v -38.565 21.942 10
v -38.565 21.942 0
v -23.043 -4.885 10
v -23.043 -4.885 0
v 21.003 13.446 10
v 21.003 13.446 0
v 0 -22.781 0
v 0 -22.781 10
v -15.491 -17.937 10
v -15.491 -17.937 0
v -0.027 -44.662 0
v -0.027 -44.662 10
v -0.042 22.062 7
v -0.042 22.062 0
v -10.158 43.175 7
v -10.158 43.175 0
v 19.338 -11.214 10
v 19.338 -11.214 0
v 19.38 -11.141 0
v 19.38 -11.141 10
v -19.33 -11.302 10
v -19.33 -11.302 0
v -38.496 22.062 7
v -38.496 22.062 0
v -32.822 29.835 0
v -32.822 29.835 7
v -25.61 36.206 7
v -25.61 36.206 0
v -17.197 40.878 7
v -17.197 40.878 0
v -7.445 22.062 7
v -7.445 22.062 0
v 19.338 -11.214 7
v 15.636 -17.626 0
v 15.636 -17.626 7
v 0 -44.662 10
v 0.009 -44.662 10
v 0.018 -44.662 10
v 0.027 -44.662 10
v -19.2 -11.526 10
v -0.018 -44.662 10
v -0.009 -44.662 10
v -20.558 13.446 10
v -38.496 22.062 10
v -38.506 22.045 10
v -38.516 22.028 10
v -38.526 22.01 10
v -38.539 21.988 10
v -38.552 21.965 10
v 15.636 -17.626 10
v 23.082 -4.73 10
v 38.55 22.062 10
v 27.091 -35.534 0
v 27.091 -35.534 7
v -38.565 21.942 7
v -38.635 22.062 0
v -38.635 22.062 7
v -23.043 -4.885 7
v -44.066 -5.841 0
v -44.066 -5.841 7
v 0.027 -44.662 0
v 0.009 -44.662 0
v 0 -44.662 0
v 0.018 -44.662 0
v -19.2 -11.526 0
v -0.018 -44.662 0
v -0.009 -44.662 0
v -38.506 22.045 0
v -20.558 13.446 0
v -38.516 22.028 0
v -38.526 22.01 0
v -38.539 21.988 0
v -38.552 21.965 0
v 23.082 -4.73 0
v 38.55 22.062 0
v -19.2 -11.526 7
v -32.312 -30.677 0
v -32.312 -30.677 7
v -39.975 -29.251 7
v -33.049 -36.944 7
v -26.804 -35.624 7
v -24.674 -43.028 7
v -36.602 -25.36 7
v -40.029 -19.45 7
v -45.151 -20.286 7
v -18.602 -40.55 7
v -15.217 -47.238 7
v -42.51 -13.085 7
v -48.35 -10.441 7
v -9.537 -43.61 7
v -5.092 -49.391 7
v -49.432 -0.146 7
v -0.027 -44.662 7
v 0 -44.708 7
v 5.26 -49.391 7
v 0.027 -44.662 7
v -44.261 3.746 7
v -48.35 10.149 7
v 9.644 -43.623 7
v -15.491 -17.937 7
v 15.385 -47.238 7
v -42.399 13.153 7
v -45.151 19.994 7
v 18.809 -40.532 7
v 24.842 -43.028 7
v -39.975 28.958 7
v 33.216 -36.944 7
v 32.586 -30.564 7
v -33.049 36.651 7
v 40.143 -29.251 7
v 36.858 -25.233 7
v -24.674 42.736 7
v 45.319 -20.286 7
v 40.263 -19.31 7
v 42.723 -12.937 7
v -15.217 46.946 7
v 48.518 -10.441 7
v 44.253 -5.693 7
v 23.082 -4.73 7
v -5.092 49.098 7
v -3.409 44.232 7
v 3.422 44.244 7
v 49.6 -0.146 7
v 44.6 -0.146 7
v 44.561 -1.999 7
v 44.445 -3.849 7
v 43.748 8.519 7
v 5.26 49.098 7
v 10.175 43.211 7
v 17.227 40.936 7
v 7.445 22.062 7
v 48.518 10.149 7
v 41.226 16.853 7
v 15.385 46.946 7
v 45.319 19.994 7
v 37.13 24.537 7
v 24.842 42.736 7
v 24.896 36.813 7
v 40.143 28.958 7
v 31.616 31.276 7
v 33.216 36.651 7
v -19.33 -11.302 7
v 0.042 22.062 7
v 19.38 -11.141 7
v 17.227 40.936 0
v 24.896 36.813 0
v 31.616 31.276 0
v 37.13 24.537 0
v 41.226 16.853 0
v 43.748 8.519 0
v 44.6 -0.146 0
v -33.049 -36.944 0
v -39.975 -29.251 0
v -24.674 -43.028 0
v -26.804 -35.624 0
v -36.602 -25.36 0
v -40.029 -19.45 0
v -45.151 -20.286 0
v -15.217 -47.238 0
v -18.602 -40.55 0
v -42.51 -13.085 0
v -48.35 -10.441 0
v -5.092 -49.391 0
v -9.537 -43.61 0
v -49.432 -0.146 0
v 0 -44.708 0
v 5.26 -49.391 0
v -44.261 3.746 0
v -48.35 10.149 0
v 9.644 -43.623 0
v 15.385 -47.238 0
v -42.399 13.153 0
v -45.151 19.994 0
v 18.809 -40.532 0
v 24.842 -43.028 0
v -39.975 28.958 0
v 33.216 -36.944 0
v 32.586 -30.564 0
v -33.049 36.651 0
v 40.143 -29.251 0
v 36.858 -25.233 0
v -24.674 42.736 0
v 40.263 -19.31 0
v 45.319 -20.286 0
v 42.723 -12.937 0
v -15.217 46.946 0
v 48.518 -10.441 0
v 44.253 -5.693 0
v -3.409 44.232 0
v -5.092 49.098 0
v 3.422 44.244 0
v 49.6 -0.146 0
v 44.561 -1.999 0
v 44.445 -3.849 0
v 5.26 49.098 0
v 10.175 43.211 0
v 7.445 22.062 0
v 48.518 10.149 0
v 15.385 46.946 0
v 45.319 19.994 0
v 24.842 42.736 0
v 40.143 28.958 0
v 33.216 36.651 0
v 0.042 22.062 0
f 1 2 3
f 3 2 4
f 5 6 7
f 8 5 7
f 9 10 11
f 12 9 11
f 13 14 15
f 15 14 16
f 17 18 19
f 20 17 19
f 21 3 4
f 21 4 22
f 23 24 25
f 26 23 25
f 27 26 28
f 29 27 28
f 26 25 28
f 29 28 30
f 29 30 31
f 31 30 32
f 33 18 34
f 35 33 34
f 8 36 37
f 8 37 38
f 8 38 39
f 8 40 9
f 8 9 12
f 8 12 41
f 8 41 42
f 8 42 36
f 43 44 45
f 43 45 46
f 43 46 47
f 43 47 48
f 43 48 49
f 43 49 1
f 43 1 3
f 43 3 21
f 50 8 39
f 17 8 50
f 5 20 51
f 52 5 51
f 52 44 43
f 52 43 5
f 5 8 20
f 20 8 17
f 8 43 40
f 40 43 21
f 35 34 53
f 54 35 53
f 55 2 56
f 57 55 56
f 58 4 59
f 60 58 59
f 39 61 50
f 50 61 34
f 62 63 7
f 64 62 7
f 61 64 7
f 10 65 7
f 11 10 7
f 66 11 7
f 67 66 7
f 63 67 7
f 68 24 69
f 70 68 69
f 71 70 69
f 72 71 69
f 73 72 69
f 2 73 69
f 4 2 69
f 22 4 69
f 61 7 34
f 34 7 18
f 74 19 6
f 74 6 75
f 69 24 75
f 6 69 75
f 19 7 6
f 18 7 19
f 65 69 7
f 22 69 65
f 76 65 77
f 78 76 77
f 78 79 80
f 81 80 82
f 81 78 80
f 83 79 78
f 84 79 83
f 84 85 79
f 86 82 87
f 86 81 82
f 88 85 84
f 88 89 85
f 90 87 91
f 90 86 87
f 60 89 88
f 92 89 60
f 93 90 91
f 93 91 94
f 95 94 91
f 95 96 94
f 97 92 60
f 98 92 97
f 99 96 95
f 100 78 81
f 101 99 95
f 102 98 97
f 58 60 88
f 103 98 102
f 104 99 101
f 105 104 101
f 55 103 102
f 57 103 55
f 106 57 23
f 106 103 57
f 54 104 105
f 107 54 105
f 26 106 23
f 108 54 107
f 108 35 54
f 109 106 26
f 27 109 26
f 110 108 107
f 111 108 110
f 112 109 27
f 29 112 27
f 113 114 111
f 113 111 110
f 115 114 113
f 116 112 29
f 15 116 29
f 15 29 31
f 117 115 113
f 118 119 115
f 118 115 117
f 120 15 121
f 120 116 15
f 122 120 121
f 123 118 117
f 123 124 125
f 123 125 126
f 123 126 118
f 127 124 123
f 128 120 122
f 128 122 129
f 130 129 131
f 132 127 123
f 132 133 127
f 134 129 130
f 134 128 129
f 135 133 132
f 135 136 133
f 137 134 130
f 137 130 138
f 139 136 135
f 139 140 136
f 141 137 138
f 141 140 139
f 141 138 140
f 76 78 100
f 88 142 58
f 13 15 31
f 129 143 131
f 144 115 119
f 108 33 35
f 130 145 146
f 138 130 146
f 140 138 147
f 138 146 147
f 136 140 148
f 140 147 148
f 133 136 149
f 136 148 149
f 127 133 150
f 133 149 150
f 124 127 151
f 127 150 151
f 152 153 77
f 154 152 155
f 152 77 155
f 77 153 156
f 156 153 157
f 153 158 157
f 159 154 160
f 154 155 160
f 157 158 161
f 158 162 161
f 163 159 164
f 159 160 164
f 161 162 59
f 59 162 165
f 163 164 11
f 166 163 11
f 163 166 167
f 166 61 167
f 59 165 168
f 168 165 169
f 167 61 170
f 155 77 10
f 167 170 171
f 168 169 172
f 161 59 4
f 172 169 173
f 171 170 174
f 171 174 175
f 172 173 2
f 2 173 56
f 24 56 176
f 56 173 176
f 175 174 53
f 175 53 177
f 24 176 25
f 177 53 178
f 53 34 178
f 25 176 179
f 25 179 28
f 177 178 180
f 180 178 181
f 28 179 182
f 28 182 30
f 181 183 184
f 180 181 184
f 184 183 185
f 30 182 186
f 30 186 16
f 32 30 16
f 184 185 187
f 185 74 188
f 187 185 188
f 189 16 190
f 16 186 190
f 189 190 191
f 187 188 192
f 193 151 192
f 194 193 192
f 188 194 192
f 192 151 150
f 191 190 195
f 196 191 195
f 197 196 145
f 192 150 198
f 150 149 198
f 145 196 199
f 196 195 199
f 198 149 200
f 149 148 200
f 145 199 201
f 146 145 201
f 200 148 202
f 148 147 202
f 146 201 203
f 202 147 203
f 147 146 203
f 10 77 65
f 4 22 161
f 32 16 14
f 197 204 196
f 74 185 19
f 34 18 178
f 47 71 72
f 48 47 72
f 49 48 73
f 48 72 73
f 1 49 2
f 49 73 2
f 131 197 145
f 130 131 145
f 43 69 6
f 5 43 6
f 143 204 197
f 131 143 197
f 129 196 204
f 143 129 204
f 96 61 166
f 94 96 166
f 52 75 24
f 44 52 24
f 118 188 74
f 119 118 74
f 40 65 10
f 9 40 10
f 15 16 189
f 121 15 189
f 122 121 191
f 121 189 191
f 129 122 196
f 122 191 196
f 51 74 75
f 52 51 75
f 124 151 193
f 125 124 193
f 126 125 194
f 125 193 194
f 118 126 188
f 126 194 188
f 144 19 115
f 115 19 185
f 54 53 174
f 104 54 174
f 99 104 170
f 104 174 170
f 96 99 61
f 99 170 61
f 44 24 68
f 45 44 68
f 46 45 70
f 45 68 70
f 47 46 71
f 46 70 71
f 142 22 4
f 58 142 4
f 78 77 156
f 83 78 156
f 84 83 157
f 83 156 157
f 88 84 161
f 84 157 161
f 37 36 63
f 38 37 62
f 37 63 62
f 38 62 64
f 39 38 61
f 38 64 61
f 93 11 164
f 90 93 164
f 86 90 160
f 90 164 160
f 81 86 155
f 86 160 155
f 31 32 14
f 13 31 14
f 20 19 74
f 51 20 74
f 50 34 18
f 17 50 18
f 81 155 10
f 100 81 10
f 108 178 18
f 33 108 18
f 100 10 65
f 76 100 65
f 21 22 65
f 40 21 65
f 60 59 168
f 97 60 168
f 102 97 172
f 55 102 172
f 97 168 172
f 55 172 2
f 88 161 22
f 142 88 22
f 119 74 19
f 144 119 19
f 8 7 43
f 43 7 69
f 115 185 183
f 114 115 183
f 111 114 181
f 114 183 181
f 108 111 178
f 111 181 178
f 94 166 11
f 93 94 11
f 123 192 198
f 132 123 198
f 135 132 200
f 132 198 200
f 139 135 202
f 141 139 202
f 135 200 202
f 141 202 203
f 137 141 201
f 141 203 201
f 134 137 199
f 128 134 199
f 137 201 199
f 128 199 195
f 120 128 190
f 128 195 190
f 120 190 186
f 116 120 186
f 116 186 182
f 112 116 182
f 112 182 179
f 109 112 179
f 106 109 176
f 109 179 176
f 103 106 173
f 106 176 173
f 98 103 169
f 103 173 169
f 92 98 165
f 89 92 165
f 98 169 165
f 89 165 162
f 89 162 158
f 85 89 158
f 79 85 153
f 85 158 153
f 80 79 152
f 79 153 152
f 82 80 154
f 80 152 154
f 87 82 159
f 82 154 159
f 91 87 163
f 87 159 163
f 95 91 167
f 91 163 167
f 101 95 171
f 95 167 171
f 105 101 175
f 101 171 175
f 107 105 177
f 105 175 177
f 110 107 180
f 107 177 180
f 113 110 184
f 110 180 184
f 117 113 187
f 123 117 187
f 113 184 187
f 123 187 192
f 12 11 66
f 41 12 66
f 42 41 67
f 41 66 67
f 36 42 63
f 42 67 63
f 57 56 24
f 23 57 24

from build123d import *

# Parameters (mm, degrees)
F0_R     = 49.5157627348
F1_DEPTH = 7
F2_DEPTH = 10


with BuildPart() as f1:
    # F0 (on Top) → F1 (new body)
    with BuildSketch(Plane.XY):
        with Locations((0.0839262699, -0.1461637082)):
            Circle(F0_R)
        with BuildLine():
            Line((0.0267643967, -44.6618897427), (0, -44.7082470376))
            Line((0, -44.7082470376), (-0.0268818374, -44.6617885317))
            ThreePointArc((-0.0268818374, -44.6617885317), (-14.1516044467, -42.324390284), (-26.8038826396, -35.6243099945))
            ThreePointArc((-26.8038826396, -35.6243099945), (-29.6611996613, -33.2653517296), (-32.3124416737, -30.6769428651))
            ThreePointArc((-32.3124416737, -30.6769428651), (-38.429049495, -22.4711234975), (-42.509896824, -13.0852272796))
            ThreePointArc((-42.509896824, -13.0852272796), (-43.4389725447, -9.4955171959), (-44.066075615, -5.8409389824))
            ThreePointArc((-44.066075615, -5.8409389824), (-43.5841571557, 8.499738315), (-38.5652678357, 21.9421347063))
            Line((-38.5652678357, 21.9421347063), (-38.6347375564, 22.0621956747))
            Line((-38.6347375564, 22.0621956747), (-38.4964042805, 22.0621956747))
            ThreePointArc((-38.4964042805, 22.0621956747), (-29.3887182603, 33.2157360617), (-17.1971452384, 40.8784350026))
            ThreePointArc((-17.1971452384, 40.8784350026), (-13.7255689437, 42.1734649977), (-10.1583201055, 43.1753034997))
            ThreePointArc((-10.1583201055, 43.1753034997), (0.0064318364, 44.3695315741), (10.1752800628, 43.2107009211))
            ThreePointArc((10.1752800628, 43.2107009211), (13.7485980478, 42.2204490553), (17.2271071561, 40.9362471383))
            ThreePointArc((17.2271071561, 40.9362471383), (37.1298093388, 24.5369414349), (44.5996890047, -0.1461637082))
            ThreePointArc((44.5996890047, -0.1461637082), (44.5128837908, -2.9248082447), (44.2528066877, -5.6926161328))
            ThreePointArc((44.2528066877, -5.6926161328), (43.6385474147, -9.3466043928), (42.7225405888, -12.9368517593))
            ThreePointArc((42.7225405888, -12.9368517593), (38.6743964683, -22.3368992014), (32.5863955708, -30.5639647662))
            ThreePointArc((32.5863955708, -30.5639647662), (29.9421533065, -33.1634229841), (27.0907472686, -35.5337992806))
            ThreePointArc((27.0907472686, -35.5337992806), (14.3107158099, -42.3273395008), (0.0267643967, -44.6618897427))
        make_face(mode=Mode.SUBTRACT)
        with BuildLine():
            Line((0.0424022413, 22.0621956747), (7.4453759007, 22.0621956747))
            Line((7.4453759007, 22.0621956747), (17.2271071561, 40.9362471383))
            ThreePointArc((17.2271071561, 40.9362471383), (13.7485980478, 42.2204490553), (10.1752800628, 43.2107009211))
            Line((10.1752800628, 43.2107009211), (0.0424022413, 22.0621956747))
        make_face()
        with BuildLine():
            Line((-17.1971452384, 40.8784350026), (-7.4453759007, 22.0621956747))
            Line((-7.4453759007, 22.0621956747), (-0.0424022413, 22.0621956747))
            Line((-0.0424022413, 22.0621956747), (-10.1583201055, 43.1753034997))
            ThreePointArc((-10.1583201055, 43.1753034997), (-13.7255689437, 42.1734649977), (-17.1971452384, 40.8784350026))
        make_face()
        with BuildLine():
            Line((23.0815807572, -4.7297764472), (19.3800939274, -11.1409396998))
            Line((19.3800939274, -11.1409396998), (42.7225405888, -12.9368517593))
            ThreePointArc((42.7225405888, -12.9368517593), (43.6385474147, -9.3466043928), (44.2528066877, -5.6926161328))
            Line((44.2528066877, -5.6926161328), (23.0815807572, -4.7297764472))
        make_face()
        with BuildLine():
            Line((19.3376916862, -11.2143825361), (15.6362048564, -17.6255457887))
            Line((15.6362048564, -17.6255457887), (27.0907472686, -35.5337992806))
            ThreePointArc((27.0907472686, -35.5337992806), (29.9421533065, -33.1634229841), (32.5863955708, -30.5639647662))
            Line((32.5863955708, -30.5639647662), (19.3376916862, -11.2143825361))
        make_face()
        with BuildLine():
            Line((-26.8038826396, -35.6243099945), (-15.4905179287, -17.9367764554))
            Line((-15.4905179287, -17.9367764554), (-19.1998425991, -11.5261401713))
            Line((-19.1998425991, -11.5261401713), (-32.3124416737, -30.6769428651))
            ThreePointArc((-32.3124416737, -30.6769428651), (-29.6611996613, -33.2653517296), (-26.8038826396, -35.6243099945))
        make_face()
        with BuildLine():
            Line((-42.509896824, -13.0852272796), (-19.3296534264, -11.3017947516))
            Line((-19.3296534264, -11.3017947516), (-23.0426451757, -4.8848208426))
            Line((-23.0426451757, -4.8848208426), (-44.066075615, -5.8409389824))
            ThreePointArc((-44.066075615, -5.8409389824), (-43.4389725447, -9.4955171959), (-42.509896824, -13.0852272796))
        make_face()
    extrude(amount=F1_DEPTH)


with BuildPart() as f2:
    # F0 (on Top) → F2 (new body)
    with BuildSketch(Plane.XY):
        with BuildLine():
            Line((-20.5581244081, 13.4461242706), (21.0026260465, 13.4461242706))
            Line((21.0026260465, 13.4461242706), (38.5499330739, 22.0621956747))
            Line((38.5499330739, 22.0621956747), (7.4453759007, 22.0621956747))
            Line((7.4453759007, 22.0621956747), (0.0424022413, 22.0621956747))
            Line((0.0424022413, 22.0621956747), (-0.0424022413, 22.0621956747))
            Line((-0.0424022413, 22.0621956747), (-7.4453759007, 22.0621956747))
            Line((-7.4453759007, 22.0621956747), (-38.4964042805, 22.0621956747))
            ThreePointArc((-38.4964042805, 22.0621956747), (-38.511286477, 22.036322286), (-38.5261513218, 22.0104389245))
            Line((-38.5261513218, 22.0104389245), (-20.5581244081, 13.4461242706))
        make_face()
        with BuildLine():
            ThreePointArc((0, -44.6618473292), (0.0133821951, -44.6618705474), (0.0267643967, -44.6618897427))
            Line((0.0267643967, -44.6618897427), (15.6362048564, -17.6255457887))
            Line((15.6362048564, -17.6255457887), (19.3376916862, -11.2143825361))
            Line((19.3376916862, -11.2143825361), (19.3800939274, -11.1409396998))
            Line((19.3800939274, -11.1409396998), (23.0815807572, -4.7297764472))
            Line((23.0815807572, -4.7297764472), (38.5499330739, 22.0621956747))
            Line((38.5499330739, 22.0621956747), (21.0026260465, 13.4461242706))
            Line((21.0026260465, 13.4461242706), (0, -22.7806251496))
            Line((0, -22.7806251496), (0, -44.6618473292))
        make_face()
        with BuildLine():
            Line((-15.4905179287, -17.9367764554), (-0.0268818374, -44.6617885317))
            ThreePointArc((-0.0268818374, -44.6617885317), (-0.0134409231, -44.6618199596), (0, -44.6618473292))
            Line((0, -44.6618473292), (0, -22.7806251496))
            Line((0, -22.7806251496), (-20.5581244081, 13.4461242706))
            Line((-20.5581244081, 13.4461242706), (-38.5261513218, 22.0104389245))
            ThreePointArc((-38.5261513218, 22.0104389245), (-38.5457246755, 21.976295461), (-38.5652678357, 21.9421347063))
            Line((-38.5652678357, 21.9421347063), (-23.0426451757, -4.8848208426))
            Line((-23.0426451757, -4.8848208426), (-19.3296534264, -11.3017947516))
            Line((-19.3296534264, -11.3017947516), (-19.1998425991, -11.5261401713))
            Line((-19.1998425991, -11.5261401713), (-15.4905179287, -17.9367764554))
        make_face()
    extrude(amount=F2_DEPTH)


solid = Compound([f1.part, f2.part])
